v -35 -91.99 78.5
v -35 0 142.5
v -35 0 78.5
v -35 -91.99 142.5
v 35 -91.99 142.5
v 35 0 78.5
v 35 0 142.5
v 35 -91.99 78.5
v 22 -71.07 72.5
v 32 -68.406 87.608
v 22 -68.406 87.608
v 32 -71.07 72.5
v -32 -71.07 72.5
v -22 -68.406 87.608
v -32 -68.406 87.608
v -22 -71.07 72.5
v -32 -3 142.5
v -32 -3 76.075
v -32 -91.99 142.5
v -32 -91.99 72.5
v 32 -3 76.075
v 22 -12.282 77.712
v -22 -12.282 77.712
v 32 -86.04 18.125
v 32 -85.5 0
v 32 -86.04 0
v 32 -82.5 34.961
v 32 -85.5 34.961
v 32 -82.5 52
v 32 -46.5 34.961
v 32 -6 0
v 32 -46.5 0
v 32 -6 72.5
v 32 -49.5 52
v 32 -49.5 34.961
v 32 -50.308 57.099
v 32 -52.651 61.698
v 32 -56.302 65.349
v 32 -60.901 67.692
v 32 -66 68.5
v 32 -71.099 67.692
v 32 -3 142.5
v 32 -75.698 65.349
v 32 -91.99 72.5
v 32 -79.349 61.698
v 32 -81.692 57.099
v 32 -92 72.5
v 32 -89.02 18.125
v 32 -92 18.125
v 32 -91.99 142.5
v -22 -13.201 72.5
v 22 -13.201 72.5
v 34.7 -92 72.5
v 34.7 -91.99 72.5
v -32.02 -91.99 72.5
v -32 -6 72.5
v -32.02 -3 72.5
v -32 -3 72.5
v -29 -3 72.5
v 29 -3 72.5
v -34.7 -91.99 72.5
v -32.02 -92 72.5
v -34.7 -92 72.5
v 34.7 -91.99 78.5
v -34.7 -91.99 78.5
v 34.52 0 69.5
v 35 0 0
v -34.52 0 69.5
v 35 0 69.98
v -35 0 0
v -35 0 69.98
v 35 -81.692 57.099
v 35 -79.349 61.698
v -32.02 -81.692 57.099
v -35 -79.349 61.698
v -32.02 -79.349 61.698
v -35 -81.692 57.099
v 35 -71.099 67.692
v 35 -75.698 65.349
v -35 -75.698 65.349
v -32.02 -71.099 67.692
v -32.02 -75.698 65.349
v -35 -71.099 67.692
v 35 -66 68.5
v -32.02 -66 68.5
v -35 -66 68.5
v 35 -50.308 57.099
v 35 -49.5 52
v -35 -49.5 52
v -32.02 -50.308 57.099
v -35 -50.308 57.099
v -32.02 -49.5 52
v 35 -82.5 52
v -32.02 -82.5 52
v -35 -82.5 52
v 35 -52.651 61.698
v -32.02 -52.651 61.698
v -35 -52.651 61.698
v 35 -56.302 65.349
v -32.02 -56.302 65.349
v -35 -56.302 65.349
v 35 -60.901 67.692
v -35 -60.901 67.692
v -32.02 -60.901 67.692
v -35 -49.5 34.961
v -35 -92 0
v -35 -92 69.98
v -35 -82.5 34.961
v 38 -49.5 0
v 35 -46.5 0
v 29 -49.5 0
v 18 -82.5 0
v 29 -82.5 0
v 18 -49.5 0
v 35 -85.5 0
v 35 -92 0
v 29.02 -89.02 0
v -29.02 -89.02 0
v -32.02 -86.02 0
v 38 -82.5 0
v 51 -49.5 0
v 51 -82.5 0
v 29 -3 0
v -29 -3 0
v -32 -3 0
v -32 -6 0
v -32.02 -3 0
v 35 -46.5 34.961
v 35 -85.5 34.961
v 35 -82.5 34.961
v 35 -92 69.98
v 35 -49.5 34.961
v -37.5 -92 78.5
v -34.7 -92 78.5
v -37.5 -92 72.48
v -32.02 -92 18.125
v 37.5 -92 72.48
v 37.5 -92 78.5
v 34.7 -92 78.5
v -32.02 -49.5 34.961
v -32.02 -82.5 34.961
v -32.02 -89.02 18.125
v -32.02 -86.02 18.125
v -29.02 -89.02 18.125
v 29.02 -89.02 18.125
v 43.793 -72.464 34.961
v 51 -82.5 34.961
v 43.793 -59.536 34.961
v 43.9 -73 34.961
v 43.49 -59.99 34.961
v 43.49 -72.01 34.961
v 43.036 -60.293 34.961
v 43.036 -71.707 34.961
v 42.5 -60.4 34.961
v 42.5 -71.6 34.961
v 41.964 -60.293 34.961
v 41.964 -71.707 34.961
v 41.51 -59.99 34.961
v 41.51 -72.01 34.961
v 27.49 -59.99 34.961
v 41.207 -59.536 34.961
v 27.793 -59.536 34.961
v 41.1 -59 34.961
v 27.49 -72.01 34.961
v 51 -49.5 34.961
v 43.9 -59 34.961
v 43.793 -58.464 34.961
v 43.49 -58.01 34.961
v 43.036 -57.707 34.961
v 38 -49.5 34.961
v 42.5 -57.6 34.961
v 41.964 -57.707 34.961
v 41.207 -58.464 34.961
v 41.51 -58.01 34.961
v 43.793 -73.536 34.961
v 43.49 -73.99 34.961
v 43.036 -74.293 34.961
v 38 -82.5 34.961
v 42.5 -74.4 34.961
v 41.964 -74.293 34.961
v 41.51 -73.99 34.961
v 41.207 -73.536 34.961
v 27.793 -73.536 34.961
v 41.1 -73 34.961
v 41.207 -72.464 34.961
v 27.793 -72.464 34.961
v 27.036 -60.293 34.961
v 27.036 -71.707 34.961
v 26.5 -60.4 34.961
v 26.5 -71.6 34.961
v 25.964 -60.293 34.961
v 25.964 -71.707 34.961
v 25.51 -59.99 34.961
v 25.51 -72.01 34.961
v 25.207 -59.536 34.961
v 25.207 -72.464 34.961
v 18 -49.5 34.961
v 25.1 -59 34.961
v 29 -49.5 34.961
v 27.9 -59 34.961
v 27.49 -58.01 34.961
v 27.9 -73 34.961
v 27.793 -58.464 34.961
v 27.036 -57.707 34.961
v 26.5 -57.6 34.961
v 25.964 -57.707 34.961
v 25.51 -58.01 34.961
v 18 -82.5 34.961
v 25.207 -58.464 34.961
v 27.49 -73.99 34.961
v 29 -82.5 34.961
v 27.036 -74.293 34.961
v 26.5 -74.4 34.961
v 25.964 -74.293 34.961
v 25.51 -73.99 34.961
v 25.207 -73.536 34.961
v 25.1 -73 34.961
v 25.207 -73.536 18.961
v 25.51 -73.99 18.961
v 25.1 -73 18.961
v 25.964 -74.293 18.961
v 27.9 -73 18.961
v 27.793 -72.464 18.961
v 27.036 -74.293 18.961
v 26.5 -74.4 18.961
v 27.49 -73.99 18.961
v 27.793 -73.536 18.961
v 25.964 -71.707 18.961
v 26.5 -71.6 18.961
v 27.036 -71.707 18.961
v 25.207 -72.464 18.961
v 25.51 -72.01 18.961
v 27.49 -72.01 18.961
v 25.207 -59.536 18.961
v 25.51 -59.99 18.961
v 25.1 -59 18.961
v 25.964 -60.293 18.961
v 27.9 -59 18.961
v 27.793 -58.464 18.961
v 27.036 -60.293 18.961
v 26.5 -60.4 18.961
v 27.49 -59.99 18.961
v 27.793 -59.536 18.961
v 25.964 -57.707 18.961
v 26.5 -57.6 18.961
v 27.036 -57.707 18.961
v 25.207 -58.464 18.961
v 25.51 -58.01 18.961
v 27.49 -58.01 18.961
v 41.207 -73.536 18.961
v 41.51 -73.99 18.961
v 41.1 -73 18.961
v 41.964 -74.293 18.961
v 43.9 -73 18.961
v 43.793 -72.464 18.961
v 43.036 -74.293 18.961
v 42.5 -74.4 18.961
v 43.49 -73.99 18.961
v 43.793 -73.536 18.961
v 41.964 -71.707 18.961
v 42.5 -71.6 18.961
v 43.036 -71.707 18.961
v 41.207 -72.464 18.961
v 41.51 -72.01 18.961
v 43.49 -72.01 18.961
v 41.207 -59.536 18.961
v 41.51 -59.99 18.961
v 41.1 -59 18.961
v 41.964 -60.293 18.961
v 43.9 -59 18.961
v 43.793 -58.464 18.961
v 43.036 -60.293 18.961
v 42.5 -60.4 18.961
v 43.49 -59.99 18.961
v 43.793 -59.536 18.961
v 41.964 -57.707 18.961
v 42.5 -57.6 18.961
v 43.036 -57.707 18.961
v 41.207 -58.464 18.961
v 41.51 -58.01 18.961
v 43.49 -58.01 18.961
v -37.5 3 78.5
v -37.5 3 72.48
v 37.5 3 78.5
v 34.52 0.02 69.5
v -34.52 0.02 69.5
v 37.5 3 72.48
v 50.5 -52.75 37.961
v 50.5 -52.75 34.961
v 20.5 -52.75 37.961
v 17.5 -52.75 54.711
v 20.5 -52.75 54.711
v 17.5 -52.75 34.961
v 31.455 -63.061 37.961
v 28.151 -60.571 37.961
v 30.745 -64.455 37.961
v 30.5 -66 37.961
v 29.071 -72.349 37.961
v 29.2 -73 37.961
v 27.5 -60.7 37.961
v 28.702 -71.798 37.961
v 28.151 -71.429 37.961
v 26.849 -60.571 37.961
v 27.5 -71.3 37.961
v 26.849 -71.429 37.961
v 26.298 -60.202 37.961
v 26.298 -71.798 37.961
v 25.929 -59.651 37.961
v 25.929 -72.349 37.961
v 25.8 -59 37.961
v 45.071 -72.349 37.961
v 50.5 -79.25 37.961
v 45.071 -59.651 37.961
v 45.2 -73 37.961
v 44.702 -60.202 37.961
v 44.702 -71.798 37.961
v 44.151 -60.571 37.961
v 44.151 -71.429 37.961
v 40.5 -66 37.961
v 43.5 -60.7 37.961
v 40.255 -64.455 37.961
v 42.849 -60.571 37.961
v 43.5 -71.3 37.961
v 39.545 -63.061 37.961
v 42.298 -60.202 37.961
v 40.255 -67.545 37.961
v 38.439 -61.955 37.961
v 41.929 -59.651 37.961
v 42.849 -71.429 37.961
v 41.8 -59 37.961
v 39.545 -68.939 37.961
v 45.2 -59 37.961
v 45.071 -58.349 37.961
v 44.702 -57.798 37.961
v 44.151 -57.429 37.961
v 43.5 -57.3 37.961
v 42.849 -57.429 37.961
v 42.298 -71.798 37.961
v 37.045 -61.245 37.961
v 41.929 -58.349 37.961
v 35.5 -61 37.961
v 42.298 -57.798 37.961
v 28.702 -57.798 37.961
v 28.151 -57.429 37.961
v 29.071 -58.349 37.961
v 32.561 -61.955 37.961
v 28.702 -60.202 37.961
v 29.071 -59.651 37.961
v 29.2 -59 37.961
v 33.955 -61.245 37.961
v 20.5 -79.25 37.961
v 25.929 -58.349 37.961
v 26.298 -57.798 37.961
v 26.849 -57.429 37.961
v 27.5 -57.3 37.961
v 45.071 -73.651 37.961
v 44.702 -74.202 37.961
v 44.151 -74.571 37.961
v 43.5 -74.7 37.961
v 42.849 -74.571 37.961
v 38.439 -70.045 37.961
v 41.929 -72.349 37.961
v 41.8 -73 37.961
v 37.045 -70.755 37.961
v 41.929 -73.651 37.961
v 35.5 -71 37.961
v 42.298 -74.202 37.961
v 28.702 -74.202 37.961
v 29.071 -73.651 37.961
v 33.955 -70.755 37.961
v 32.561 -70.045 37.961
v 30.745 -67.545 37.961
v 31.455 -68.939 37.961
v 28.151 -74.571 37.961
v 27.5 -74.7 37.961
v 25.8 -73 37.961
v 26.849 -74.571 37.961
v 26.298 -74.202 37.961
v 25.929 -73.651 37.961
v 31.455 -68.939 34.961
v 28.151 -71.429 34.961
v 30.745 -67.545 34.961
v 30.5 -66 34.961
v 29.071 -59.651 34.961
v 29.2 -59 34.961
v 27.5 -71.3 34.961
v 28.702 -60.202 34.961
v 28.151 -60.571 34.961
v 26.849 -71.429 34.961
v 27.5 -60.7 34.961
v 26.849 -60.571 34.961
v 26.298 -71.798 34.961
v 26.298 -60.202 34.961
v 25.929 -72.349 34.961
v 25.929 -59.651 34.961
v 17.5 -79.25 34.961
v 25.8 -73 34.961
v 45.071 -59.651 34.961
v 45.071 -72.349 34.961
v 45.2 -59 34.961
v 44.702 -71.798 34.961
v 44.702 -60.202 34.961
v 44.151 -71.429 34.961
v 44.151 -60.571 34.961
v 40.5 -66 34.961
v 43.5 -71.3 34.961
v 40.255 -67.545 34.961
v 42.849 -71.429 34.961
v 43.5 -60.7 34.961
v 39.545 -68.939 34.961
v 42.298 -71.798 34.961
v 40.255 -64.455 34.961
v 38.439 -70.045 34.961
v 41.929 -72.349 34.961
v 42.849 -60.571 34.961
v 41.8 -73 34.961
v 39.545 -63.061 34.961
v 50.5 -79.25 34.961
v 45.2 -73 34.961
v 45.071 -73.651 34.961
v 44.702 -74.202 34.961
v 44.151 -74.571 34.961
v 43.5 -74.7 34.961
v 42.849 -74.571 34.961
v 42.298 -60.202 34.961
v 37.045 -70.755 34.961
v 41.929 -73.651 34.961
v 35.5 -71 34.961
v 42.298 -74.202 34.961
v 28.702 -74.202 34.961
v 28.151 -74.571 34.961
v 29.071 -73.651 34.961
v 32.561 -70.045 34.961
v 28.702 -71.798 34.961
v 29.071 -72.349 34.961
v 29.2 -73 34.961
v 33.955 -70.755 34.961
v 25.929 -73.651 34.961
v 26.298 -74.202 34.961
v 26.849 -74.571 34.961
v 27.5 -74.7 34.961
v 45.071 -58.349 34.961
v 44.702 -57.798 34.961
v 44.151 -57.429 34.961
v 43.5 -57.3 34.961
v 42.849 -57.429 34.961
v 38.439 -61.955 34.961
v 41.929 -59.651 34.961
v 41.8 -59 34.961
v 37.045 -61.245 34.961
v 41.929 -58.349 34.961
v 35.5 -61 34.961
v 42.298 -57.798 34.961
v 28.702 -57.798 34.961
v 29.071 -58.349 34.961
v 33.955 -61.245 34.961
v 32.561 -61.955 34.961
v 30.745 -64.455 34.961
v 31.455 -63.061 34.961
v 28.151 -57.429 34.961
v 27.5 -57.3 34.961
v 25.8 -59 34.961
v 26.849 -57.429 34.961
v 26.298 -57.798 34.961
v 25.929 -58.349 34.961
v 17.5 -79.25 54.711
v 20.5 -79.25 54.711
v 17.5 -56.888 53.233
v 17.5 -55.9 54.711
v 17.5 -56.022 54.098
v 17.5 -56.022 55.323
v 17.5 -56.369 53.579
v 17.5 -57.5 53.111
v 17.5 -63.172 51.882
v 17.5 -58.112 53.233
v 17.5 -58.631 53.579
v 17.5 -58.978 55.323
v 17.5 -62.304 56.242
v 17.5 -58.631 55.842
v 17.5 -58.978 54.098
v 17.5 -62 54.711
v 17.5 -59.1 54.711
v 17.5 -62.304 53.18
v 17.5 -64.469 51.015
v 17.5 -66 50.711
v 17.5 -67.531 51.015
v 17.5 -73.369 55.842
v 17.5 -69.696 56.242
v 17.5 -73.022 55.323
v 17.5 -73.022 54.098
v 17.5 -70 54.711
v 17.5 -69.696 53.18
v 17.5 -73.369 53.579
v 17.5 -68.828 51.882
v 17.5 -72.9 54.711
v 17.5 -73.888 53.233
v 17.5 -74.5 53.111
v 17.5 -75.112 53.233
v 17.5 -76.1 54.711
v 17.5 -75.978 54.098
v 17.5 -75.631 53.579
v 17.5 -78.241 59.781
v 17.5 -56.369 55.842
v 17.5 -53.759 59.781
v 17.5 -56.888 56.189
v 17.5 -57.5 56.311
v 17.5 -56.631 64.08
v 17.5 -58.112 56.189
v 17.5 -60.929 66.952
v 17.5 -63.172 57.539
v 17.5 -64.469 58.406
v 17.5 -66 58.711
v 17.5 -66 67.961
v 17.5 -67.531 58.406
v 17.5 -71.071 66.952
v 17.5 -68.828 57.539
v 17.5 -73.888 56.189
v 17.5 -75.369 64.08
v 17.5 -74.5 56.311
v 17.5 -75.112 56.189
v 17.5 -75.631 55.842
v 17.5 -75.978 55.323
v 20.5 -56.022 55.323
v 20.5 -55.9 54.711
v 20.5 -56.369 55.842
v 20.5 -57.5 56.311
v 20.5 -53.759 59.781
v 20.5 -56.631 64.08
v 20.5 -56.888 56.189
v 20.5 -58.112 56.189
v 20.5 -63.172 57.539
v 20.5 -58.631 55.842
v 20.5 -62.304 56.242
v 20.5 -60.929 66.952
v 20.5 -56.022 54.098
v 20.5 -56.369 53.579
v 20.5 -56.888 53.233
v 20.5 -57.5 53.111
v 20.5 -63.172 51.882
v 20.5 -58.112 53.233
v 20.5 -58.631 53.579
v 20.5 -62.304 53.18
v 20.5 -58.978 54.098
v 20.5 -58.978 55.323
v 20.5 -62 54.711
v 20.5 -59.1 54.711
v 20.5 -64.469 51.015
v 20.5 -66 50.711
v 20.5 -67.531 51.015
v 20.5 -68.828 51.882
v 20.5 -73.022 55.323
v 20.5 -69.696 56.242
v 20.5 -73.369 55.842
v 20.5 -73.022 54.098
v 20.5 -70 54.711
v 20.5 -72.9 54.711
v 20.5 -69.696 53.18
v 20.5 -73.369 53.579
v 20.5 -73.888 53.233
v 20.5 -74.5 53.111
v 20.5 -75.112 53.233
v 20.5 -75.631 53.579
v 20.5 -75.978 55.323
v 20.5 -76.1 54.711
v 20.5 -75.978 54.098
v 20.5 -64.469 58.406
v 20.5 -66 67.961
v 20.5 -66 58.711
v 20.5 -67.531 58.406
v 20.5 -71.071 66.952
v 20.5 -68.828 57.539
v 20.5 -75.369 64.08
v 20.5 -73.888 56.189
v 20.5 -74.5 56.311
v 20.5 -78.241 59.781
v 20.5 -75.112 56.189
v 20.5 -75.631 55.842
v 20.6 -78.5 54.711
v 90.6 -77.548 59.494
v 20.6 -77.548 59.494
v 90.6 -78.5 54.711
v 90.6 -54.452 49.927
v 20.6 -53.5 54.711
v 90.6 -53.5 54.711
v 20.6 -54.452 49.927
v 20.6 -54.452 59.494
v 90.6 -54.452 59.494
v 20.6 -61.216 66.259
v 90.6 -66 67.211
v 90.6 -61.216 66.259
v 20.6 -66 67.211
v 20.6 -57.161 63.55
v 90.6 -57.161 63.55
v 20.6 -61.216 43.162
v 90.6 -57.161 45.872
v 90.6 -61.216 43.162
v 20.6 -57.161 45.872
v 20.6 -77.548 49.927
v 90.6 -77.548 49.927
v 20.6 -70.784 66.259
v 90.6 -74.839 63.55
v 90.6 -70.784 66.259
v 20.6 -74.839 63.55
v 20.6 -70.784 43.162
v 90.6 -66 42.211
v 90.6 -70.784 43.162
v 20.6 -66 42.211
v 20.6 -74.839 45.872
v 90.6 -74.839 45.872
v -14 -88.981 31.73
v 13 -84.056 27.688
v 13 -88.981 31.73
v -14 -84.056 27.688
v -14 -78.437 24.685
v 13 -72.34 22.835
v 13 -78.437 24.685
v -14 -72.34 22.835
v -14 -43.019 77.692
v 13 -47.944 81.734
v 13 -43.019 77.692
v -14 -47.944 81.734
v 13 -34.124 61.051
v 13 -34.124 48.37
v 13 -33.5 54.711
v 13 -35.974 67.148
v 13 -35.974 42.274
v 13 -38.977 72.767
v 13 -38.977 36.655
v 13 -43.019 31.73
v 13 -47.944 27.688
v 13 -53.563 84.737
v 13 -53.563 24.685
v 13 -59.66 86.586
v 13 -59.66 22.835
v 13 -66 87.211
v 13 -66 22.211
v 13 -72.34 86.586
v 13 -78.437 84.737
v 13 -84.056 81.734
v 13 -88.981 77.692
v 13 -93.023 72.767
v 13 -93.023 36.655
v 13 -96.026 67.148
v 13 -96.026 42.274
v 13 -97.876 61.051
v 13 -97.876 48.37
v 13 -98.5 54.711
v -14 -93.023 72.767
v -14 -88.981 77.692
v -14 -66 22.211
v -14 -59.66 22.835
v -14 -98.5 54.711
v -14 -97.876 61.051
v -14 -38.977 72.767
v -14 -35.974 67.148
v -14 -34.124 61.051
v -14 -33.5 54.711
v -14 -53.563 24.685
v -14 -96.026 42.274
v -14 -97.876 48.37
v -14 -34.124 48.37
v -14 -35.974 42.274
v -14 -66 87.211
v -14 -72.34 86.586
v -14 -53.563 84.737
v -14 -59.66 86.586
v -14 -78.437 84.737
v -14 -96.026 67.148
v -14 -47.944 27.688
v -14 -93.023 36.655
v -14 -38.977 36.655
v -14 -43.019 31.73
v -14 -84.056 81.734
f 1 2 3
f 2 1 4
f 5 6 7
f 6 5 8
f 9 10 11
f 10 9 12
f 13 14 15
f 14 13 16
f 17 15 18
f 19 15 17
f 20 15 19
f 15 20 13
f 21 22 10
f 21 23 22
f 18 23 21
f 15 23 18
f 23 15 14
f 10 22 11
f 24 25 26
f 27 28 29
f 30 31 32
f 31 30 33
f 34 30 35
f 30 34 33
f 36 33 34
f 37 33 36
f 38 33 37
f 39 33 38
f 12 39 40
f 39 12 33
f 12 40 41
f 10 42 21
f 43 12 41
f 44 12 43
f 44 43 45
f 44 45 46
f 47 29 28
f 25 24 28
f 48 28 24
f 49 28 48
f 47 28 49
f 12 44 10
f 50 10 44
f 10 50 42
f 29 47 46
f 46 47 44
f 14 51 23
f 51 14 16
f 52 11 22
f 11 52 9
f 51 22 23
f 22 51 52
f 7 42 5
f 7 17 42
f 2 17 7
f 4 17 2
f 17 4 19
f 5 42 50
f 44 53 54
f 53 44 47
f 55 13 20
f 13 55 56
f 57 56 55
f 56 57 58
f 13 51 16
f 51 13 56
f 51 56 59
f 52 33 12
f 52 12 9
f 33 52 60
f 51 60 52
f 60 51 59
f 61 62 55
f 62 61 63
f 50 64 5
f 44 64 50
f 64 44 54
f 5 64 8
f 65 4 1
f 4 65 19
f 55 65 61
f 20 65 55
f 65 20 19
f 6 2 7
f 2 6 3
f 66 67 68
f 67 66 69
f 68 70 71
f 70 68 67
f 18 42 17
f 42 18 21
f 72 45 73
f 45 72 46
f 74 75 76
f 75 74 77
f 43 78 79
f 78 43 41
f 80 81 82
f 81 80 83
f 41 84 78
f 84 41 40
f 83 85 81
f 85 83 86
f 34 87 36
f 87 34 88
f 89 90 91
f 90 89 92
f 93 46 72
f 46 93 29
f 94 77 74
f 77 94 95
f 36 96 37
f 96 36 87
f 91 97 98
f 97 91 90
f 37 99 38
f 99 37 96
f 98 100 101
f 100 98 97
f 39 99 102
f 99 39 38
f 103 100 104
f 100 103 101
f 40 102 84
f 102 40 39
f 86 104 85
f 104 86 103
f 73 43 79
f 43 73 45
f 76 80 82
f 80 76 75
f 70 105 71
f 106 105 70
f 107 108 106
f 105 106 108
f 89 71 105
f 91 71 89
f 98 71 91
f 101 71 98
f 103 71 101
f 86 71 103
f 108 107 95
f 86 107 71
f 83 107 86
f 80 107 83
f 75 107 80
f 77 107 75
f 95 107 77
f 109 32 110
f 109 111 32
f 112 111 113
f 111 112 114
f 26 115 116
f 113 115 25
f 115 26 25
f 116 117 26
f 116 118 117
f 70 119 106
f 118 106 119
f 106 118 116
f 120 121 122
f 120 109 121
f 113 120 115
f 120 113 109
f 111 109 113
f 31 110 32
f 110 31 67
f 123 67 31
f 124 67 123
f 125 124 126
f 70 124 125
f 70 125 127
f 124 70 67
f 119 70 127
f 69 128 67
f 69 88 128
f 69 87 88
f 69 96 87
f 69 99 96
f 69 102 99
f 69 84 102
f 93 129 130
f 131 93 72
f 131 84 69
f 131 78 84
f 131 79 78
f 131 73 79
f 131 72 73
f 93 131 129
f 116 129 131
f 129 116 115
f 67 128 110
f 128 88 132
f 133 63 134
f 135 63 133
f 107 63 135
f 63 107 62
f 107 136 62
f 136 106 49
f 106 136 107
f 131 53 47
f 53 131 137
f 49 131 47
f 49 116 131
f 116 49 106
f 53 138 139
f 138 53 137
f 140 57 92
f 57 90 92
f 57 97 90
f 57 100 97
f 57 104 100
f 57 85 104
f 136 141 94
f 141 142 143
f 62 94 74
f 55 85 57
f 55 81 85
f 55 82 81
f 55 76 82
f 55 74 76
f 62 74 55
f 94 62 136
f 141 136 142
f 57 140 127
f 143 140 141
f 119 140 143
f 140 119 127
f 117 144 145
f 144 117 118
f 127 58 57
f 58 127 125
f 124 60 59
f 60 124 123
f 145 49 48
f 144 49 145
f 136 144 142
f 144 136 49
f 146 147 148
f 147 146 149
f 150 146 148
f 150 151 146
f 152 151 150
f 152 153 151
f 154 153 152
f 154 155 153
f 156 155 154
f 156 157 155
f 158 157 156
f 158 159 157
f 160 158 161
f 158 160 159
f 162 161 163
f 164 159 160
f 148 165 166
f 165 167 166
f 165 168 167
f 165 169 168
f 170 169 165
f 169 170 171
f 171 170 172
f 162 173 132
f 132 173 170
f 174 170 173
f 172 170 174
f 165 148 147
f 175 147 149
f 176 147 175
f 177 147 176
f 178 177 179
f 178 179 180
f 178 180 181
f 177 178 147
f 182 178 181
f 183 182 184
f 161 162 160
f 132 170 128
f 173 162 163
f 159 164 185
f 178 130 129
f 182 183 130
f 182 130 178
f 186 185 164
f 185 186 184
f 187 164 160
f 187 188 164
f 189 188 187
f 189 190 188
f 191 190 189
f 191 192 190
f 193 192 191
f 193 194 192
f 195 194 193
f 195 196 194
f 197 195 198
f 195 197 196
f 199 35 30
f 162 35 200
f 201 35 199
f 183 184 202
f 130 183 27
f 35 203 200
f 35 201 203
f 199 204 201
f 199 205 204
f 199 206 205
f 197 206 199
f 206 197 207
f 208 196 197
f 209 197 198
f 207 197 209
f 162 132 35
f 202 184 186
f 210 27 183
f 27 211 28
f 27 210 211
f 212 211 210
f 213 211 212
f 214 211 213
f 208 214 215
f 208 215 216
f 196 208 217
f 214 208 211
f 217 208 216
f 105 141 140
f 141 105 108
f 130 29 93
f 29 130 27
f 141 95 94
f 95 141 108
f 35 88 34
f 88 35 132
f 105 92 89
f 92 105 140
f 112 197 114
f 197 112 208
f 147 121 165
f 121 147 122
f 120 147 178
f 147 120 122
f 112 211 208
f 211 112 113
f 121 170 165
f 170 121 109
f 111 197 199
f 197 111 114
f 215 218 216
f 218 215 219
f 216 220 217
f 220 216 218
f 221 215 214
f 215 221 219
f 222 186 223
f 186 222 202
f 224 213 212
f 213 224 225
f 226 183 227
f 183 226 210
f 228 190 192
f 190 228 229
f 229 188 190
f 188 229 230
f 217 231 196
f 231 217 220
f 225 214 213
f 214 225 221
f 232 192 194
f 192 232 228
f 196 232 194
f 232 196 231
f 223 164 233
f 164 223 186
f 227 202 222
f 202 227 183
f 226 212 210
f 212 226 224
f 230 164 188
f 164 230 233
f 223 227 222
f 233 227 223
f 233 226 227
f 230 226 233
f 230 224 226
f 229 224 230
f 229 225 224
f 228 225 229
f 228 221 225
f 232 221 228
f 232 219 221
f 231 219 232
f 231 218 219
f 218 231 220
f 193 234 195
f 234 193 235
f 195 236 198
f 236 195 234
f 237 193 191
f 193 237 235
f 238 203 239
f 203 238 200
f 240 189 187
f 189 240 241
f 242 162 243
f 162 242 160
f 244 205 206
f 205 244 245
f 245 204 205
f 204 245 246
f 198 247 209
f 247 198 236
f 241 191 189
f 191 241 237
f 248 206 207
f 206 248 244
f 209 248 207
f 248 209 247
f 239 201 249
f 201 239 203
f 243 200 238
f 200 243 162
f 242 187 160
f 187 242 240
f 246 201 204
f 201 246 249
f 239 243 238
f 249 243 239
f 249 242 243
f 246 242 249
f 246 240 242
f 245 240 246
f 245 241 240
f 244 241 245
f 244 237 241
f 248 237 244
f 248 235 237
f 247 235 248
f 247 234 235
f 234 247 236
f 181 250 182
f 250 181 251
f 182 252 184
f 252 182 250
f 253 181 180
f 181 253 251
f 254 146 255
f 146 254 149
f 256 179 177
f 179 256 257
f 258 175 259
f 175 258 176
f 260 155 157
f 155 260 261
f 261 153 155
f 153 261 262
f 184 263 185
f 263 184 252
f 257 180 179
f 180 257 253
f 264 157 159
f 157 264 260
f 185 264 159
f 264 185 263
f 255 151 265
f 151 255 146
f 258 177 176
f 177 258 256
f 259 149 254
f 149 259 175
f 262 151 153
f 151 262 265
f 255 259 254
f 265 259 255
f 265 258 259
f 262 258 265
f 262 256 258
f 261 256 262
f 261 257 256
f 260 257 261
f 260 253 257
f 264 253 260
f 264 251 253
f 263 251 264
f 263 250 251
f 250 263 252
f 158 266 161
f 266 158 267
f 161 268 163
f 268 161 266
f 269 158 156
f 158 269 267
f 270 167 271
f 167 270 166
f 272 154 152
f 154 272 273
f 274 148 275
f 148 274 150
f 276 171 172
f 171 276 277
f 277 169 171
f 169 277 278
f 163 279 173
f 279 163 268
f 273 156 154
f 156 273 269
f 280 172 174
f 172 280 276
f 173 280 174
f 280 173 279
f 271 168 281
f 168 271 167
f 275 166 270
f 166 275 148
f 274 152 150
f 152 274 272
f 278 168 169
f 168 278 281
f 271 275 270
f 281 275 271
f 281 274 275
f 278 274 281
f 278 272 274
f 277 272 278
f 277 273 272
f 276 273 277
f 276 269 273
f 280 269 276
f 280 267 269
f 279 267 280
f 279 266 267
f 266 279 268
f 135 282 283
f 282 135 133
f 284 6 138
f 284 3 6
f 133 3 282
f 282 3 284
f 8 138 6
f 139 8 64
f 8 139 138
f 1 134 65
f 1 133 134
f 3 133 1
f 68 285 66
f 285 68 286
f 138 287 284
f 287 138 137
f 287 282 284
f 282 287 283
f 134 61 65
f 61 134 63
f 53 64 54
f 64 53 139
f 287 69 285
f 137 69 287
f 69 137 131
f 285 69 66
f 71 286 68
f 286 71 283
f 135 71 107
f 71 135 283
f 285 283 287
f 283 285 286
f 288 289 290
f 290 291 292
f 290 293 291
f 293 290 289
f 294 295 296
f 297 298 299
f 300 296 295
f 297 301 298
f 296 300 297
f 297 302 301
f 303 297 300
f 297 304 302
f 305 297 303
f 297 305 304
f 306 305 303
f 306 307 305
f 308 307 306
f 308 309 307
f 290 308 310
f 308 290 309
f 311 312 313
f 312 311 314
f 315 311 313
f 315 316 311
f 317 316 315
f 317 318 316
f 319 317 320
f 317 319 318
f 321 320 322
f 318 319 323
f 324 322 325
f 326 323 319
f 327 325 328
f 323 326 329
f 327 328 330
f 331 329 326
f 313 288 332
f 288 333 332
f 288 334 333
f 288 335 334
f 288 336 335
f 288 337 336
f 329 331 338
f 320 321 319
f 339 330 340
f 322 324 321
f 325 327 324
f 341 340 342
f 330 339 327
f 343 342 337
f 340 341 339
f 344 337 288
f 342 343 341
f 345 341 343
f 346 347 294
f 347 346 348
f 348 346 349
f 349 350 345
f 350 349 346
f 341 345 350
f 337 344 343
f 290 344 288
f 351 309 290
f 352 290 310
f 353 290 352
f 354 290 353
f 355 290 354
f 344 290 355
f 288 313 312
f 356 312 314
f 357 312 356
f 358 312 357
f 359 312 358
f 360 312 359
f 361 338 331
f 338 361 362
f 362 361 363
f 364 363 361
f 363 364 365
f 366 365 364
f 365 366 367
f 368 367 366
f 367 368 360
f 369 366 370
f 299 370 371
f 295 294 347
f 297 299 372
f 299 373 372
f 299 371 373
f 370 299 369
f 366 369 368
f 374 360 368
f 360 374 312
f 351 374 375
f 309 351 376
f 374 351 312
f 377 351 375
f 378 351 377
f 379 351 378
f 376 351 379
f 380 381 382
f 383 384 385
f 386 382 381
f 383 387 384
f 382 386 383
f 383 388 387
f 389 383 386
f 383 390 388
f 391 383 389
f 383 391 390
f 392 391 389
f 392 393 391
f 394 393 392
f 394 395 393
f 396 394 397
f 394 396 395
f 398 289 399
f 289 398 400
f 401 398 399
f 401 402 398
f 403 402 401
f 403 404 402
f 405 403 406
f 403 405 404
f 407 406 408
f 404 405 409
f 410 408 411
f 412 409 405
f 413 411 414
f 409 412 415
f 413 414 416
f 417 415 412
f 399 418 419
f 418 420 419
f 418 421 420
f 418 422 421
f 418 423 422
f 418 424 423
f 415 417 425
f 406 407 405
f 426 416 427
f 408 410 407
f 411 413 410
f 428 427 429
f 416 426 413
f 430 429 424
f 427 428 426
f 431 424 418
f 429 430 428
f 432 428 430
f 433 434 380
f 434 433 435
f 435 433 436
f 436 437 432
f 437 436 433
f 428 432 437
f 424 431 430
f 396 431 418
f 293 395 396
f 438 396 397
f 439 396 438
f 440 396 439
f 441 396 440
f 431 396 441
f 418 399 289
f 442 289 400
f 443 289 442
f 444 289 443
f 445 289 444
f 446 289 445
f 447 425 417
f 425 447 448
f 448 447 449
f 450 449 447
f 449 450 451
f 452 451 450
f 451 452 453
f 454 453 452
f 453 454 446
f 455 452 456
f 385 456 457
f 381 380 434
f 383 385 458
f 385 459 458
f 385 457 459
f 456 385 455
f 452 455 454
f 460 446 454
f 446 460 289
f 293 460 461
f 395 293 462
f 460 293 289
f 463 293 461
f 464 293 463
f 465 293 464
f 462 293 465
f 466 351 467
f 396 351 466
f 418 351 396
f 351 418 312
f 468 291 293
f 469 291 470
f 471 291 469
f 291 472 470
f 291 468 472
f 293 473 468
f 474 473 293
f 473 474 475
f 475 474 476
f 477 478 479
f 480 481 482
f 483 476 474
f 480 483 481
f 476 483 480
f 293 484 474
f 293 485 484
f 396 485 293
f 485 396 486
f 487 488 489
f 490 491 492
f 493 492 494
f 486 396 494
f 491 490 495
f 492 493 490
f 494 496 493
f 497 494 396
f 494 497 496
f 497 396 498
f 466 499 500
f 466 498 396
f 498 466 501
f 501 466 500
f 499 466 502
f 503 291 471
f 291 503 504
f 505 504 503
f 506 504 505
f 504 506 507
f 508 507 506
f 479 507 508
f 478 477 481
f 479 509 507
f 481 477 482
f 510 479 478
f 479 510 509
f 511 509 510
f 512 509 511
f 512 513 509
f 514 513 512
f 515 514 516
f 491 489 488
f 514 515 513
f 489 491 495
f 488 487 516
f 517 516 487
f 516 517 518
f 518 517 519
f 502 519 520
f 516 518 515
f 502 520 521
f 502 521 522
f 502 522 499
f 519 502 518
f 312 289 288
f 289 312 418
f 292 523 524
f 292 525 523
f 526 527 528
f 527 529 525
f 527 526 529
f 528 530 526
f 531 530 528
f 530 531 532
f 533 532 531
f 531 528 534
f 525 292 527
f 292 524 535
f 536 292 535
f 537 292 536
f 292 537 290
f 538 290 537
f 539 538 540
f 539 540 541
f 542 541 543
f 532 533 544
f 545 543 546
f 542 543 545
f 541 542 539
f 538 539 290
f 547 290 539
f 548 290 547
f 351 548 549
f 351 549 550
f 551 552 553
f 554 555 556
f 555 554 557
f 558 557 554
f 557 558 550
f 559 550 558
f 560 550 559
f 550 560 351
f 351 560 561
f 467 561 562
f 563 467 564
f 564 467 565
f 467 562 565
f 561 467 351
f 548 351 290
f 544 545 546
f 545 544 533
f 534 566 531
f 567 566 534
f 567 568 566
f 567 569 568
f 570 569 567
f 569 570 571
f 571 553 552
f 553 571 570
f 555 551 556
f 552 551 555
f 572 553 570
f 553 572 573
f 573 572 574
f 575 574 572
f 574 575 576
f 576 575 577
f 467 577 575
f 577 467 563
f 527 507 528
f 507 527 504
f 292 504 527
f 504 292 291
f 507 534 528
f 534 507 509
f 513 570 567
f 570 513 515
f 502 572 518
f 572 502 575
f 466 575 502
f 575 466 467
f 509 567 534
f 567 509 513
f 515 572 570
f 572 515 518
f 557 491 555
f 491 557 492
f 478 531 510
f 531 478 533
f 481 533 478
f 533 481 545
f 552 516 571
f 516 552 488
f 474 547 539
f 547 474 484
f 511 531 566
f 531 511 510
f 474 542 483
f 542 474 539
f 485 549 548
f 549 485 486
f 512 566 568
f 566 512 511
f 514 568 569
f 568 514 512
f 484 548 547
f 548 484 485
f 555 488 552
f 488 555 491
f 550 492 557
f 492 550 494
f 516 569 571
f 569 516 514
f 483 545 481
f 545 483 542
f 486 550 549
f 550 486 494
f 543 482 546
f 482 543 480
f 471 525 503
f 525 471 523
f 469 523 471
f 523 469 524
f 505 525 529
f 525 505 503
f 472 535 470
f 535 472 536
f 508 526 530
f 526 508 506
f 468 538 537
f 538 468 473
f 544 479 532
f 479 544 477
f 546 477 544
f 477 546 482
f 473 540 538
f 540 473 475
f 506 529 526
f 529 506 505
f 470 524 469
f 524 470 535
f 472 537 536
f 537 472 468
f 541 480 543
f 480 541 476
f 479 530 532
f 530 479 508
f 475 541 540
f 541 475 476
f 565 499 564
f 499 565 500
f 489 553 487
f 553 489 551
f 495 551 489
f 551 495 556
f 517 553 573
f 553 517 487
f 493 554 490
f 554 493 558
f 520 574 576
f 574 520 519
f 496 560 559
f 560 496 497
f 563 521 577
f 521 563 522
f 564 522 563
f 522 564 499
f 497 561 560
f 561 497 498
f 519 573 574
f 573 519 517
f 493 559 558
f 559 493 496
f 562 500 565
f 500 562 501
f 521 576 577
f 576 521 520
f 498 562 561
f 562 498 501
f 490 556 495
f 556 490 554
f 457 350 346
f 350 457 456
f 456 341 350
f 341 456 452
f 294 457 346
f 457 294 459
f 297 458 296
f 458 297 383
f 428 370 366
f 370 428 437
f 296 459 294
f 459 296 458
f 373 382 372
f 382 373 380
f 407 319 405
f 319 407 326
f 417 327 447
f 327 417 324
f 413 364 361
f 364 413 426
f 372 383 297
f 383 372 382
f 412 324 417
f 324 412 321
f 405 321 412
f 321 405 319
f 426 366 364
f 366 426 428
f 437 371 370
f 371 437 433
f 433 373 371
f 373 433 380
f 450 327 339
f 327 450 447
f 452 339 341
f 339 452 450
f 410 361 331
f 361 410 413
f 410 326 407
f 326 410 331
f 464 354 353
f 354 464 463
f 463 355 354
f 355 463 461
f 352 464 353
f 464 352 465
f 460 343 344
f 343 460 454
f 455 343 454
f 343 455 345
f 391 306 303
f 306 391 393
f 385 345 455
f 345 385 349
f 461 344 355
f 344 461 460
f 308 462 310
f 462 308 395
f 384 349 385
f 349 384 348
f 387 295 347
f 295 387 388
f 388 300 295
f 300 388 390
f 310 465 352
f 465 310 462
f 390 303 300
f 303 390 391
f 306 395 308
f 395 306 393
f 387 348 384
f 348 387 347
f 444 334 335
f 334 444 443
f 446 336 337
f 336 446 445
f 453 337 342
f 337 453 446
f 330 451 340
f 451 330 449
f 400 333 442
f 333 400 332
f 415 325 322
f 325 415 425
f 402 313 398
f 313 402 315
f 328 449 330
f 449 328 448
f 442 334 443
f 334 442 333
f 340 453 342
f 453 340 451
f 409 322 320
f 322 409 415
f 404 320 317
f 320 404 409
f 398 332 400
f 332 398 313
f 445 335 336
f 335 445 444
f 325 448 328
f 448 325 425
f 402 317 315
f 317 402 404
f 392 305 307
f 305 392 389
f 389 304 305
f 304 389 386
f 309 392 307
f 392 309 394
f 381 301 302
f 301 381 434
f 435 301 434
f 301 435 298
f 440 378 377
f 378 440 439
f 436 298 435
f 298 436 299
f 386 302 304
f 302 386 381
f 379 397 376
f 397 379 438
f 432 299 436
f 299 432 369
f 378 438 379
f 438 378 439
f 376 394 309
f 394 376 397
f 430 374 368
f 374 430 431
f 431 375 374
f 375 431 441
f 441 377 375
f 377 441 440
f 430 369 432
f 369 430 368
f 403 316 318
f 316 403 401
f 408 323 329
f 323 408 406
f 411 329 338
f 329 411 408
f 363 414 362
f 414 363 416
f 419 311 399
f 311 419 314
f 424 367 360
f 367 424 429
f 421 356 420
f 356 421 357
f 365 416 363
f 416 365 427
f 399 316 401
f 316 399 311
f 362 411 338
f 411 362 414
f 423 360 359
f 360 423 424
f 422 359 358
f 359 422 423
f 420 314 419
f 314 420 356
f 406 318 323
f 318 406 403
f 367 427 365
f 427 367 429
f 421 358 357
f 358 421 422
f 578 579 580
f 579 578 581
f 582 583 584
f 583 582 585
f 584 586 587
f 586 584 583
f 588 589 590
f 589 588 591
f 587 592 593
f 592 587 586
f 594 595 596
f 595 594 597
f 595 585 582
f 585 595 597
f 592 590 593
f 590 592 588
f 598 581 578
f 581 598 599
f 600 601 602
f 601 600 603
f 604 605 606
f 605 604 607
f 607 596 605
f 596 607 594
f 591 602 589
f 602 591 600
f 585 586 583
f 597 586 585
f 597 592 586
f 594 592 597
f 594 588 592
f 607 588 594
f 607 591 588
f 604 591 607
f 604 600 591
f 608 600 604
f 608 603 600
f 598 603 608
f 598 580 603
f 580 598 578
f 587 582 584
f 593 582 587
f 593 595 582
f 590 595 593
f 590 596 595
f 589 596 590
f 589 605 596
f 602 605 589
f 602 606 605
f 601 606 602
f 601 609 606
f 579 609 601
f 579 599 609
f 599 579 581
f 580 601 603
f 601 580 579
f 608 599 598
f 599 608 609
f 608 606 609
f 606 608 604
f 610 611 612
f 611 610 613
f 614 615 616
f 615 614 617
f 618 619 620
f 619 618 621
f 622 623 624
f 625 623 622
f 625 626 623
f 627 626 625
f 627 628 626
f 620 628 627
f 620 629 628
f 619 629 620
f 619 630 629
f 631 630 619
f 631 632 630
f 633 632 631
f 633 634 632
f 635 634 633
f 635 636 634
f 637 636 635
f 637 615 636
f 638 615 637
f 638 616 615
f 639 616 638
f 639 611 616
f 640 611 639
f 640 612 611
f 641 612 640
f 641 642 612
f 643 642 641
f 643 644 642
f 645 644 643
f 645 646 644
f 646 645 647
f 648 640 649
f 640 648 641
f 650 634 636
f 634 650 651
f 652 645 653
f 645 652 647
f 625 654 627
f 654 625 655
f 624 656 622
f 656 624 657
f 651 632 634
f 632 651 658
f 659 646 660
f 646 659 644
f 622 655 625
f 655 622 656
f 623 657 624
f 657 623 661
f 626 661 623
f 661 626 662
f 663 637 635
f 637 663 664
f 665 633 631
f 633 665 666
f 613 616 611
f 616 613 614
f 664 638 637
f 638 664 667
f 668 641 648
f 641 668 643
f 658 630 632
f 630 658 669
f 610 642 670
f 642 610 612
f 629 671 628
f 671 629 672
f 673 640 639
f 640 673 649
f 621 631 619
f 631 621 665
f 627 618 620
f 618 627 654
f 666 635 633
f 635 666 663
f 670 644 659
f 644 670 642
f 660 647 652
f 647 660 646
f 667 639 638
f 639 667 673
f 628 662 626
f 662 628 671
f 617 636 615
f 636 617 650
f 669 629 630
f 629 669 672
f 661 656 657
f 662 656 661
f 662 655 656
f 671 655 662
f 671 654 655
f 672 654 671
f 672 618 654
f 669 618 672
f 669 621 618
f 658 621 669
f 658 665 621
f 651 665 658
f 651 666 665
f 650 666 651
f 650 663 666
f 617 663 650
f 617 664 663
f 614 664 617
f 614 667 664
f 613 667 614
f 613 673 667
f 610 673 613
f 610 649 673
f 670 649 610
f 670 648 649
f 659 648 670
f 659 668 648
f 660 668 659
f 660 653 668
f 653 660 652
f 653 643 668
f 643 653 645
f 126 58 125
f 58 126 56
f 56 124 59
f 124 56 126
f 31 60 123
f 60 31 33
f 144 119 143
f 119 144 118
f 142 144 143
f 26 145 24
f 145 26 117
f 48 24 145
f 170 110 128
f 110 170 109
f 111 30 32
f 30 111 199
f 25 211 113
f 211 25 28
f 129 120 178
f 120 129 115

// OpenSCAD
// file: card_compare_machine.scad
/*

  card_compare_machine.scad
  
  (c) olikraus@gmail.com

  This work is licensed under the Creative Commons Attribution-NonCommercial-ShareAlike 4.0 International License.
  To view a copy of this license, visit http://creativecommons.org/licenses/by-nc-sa/4.0/.

*/

$fn=20;

/* dimensions of the cards */
card_width = 63;
card_height = 88;
/* outer gap of the cards */
card_gap = 1;   
/* inner rail size, must be greater than card_gap */
card_rail = 10;

/* the card rail is shorter than the cards by this value */
/* the card driving wheel is below the front rail */
card_front_gap = card_height/4;

/* the height of the tray */
tray_height = 70;

/* card tray angle: Must be < 11 Degree */
card_tray_angle = 10;

/* diameter of the drive wheel */
wheel_diameter = 65;

/* how much should the wheel lift the cards beyond tray rails */
wheel_card_lift = 0.5;

/* thickness of all the walls */
wall=3;

/* Extra gap so that the tray can be stacked on the motor house */
pile_gap = 0.2;

/* mount hole diameter */
mhd = 2.8;


/* derived: the height of the card cast edge above reference level 0 */
cast_edge_z = wall+sin(card_tray_angle)*(card_height-card_front_gap);

/* derived: motor block height */
motor_block_height = wheel_diameter/2+20+20;

/* helper objects */
module motor_mount_bracket() {
    color("DarkSlateGray", 0.4)
    difference() {
            
        translate([0,1.5,0])
        difference() {
            union() {
                translate([0,0,1.5])
                cube([26.5, 33, 3], center=true);

                translate([0,33/2-3/2,(33-26.5/2)/2])
                cube([26.5, 3, 33-26.5/2], center=true);

                translate([0,33/2,33-26.5/2])
                rotate([90,0,0])
                cylinder(h=3,d=26.5,$fn=16);
            }

            translate([0,33/2+0.1,33-26.5/2])
            rotate([90,0,0])
            cylinder(h=3.2,d=8, $fn=16);

            translate([8.5,33/2+0.1,33-26.5/2])
            rotate([90,0,0])
            cylinder(h=3.4,d=3.2, $fn=16);

            translate([-8.5,33/2+0.1,33-26.5/2])
            rotate([90,0,0])
            cylinder(h=3.4,d=3.2, $fn=16);
        }
        
        cylinder(h=8,d=10, center=true);
        
        translate([7,8,0])
        cylinder(h=8,d=3.4, center=true, $fn=16);
        
        translate([7,-8,0])
        cylinder(h=8,d=3.4, center=true, $fn=16);

        translate([-7,8,0])
        cylinder(h=8,d=3.4, center=true, $fn=16);
        
        translate([-7,-8,0])
        cylinder(h=8,d=3.4, center=true, $fn=16);
    }
}

/*
    GM25-370ABHL
    25GA 370
    6V, 165 rpm
*/
module motor() {
    motor_mount_bracket();

    color("Silver",0.3)
    translate([0,15-0.1,33-26.5/2])
    rotate([90,0,0])
    cylinder(h=70,d=25, $fn=16);

    color("Silver",0.3)
    translate([0,36,33-26.5/2])
    rotate([90,0,0])
    cylinder(h=27,d=wheel_diameter, center=true, $fn=32);
}


/* inner chamfer */
module triangle(h) {
  linear_extrude(height=h)
  polygon([[0,0],[wall,0],[0,wall]]);
}

module tray() {
  iw = card_width+card_gap;
  ih = card_height+card_gap;
  tw = card_width+card_gap+2*wall;
  th = card_height+card_gap+wall-0.01;
  tz = 20;        /* depends on card_tray_angle, just needs to be high enough */

  intersection() 
  {
    union() {
      rotate([card_tray_angle,0,0])
      difference() {
          translate([-tw/2,0,-2*tz])
          cube([tw, th-card_front_gap, 3*tz]);
          
          translate([-iw/2,wall,wall])
          cube([iw, ih-card_front_gap, tz]);

          translate(
              [-(iw-card_rail*2)/2,wall+card_rail,-2*tz-0.01])
          cube([iw-card_rail*2, ih-card_front_gap, 3*tz]);
          
          //translate([-iw/2,ih+wall-card_front_gap,-0.01])
          //cube([iw, card_front_gap, wall+0.02]);
      }

      difference() {
          translate([-tw/2,0,0])
          cube([tw, th, tray_height]);
          
          translate([-iw/2,wall,-0.01])
          cube([iw, ih, tray_height+0.02]);
      }
    }
    translate([-tw/2,0,0])
    cube([tw, th, tray_height]);
  }
}



module eject_house(isMotor=false) {

  mh = motor_block_height+cast_edge_z+wheel_card_lift-wheel_diameter/2-20;

  iw = card_width+card_gap;
  ih = card_height+card_gap-wall;

  tw = card_width+card_gap+2*wall;
  th = card_height+card_gap+wall;

  difference() {
    translate([-tw/2,0,0])
    cube([tw, th, motor_block_height]);
    
    translate([-iw/2,wall,-0.01])
    cube([iw+0.02, ih+0.02, motor_block_height+0.02]);

    translate([-iw/2,3*wall,motor_block_height/4])
    cube([iw+0.02, ih+0.02, motor_block_height]);  

    /* upper round cutout of the motor */
    translate([0,card_height-card_front_gap,motor_block_height-33/2-4])
    difference() {
      rotate([0,90,0])
      cylinder(d=33, h=2*card_width, center=true);
      
      translate([0,0,-card_height/2])
      cube([2*card_height,2*card_height,card_height], center=true);
      
    }

    /* lower block cutout of the motor */

    translate([-2*card_width/2,card_height-card_front_gap-33/2,mh])
    cube([2*card_width,33,motor_block_height-33/2-4-mh]);
    
  }

  /* 4x inner chamfer for the motor house */
  translate([card_width/2+0.5,wall,0])
  rotate([0,0,90])
  triangle(motor_block_height);
  
  translate([-card_width/2-0.5,wall,0])
  rotate([0,0,0])
  triangle(motor_block_height);
  
  translate([card_width/2+0.52,card_height+1.02,0])
  rotate([0,0,180])
  triangle(motor_block_height/4);
  
  translate([-card_width/2-0.52,card_height+1.02,0])
  rotate([0,0,-90])
  triangle(motor_block_height/4);

  /* the motor will be mounted on top of this block */

  translate([-card_width/2-33/2-wall,card_height-card_front_gap-33/2,0])
  difference() {
    cube([33,33,mh]);

    translate([8+33/2,7+33/2,mh-16])
    cylinder(h=20,d=mhd, center=false, $fn=16);
    
    translate([8+33/2,-7+33/2,mh-16])
    cylinder(h=20,d=mhd, center=false, $fn=16);

    translate([-8+33/2,7+33/2,mh-16])
    cylinder(h=20,d=mhd, center=false, $fn=16);
    
    translate([-8+33/2,-7+33/2,mh-16])
    cylinder(h=20,d=mhd, center=false, $fn=16);
  }

  /* 4x inner chamfer for the motor mount block */
  translate([-card_width/2-wall-0.5,card_height-card_front_gap-33/2,0])
  rotate([0,0,180])
  triangle(mh);

  translate([-card_width/2-0.5,card_height-card_front_gap-33/2,0])
  rotate([0,0,-90])
  triangle(mh);

  translate([-card_width/2-0.5,card_height-card_front_gap+33/2,0])
  rotate([0,0,0])
  triangle(mh);

  translate([-card_width/2-wall-0.5,card_height-card_front_gap+33/2,0])
  rotate([0,0,90])
  triangle(mh);

  difference() {
    translate([-(card_width+wall*4)/2,-wall,motor_block_height-wall])
    cube([card_width+wall*4, card_height+wall*2+1, wall*3]);
    
    translate([-(card_width+wall*2+pile_gap*2)/2,0,motor_block_height-wall-0.01])
    cube([card_width+wall*2+pile_gap*2, card_height+wall*2+1, wall*3+0.02]);

    translate([-card_width/2-wall*2-0.01,card_height*1.5,motor_block_height-wall-0.01])
    rotate([90,0,0])
    triangle(card_height*2);

    translate([+card_width/2+wall*2+0.01,card_height*1.5,motor_block_height-wall-0.01])
    rotate([90,-90,0])
    triangle(card_height*2);

    translate([-card_width,-wall-0.01,motor_block_height-wall-0.01])
    rotate([90,0,90])
    triangle(card_width*2);
    
  }
  
  
  if ( isMotor )
  {
    union() {
      translate([0,card_height-card_front_gap,mh])
      translate([-35.5,0])
      rotate([0,0,-90])
      motor();
    }
  }
}
// main file
/*

  show_eject.scad
  
  (c) olikraus@gmail.com

  This work is licensed under the Creative Commons Attribution-NonCommercial-ShareAlike 4.0 International License.
  To view a copy of this license, visit http://creativecommons.org/licenses/by-nc-sa/4.0/.

  This is an extended scad file, not intended for 3d printing.
  
*/


include <card_compare_machine.scad>;

rotate([0,0,180])
union() {
  
  color("Silver", 0.4)
  translate([0,0,motor_block_height])
  tray();

  eject_house(true);

}
